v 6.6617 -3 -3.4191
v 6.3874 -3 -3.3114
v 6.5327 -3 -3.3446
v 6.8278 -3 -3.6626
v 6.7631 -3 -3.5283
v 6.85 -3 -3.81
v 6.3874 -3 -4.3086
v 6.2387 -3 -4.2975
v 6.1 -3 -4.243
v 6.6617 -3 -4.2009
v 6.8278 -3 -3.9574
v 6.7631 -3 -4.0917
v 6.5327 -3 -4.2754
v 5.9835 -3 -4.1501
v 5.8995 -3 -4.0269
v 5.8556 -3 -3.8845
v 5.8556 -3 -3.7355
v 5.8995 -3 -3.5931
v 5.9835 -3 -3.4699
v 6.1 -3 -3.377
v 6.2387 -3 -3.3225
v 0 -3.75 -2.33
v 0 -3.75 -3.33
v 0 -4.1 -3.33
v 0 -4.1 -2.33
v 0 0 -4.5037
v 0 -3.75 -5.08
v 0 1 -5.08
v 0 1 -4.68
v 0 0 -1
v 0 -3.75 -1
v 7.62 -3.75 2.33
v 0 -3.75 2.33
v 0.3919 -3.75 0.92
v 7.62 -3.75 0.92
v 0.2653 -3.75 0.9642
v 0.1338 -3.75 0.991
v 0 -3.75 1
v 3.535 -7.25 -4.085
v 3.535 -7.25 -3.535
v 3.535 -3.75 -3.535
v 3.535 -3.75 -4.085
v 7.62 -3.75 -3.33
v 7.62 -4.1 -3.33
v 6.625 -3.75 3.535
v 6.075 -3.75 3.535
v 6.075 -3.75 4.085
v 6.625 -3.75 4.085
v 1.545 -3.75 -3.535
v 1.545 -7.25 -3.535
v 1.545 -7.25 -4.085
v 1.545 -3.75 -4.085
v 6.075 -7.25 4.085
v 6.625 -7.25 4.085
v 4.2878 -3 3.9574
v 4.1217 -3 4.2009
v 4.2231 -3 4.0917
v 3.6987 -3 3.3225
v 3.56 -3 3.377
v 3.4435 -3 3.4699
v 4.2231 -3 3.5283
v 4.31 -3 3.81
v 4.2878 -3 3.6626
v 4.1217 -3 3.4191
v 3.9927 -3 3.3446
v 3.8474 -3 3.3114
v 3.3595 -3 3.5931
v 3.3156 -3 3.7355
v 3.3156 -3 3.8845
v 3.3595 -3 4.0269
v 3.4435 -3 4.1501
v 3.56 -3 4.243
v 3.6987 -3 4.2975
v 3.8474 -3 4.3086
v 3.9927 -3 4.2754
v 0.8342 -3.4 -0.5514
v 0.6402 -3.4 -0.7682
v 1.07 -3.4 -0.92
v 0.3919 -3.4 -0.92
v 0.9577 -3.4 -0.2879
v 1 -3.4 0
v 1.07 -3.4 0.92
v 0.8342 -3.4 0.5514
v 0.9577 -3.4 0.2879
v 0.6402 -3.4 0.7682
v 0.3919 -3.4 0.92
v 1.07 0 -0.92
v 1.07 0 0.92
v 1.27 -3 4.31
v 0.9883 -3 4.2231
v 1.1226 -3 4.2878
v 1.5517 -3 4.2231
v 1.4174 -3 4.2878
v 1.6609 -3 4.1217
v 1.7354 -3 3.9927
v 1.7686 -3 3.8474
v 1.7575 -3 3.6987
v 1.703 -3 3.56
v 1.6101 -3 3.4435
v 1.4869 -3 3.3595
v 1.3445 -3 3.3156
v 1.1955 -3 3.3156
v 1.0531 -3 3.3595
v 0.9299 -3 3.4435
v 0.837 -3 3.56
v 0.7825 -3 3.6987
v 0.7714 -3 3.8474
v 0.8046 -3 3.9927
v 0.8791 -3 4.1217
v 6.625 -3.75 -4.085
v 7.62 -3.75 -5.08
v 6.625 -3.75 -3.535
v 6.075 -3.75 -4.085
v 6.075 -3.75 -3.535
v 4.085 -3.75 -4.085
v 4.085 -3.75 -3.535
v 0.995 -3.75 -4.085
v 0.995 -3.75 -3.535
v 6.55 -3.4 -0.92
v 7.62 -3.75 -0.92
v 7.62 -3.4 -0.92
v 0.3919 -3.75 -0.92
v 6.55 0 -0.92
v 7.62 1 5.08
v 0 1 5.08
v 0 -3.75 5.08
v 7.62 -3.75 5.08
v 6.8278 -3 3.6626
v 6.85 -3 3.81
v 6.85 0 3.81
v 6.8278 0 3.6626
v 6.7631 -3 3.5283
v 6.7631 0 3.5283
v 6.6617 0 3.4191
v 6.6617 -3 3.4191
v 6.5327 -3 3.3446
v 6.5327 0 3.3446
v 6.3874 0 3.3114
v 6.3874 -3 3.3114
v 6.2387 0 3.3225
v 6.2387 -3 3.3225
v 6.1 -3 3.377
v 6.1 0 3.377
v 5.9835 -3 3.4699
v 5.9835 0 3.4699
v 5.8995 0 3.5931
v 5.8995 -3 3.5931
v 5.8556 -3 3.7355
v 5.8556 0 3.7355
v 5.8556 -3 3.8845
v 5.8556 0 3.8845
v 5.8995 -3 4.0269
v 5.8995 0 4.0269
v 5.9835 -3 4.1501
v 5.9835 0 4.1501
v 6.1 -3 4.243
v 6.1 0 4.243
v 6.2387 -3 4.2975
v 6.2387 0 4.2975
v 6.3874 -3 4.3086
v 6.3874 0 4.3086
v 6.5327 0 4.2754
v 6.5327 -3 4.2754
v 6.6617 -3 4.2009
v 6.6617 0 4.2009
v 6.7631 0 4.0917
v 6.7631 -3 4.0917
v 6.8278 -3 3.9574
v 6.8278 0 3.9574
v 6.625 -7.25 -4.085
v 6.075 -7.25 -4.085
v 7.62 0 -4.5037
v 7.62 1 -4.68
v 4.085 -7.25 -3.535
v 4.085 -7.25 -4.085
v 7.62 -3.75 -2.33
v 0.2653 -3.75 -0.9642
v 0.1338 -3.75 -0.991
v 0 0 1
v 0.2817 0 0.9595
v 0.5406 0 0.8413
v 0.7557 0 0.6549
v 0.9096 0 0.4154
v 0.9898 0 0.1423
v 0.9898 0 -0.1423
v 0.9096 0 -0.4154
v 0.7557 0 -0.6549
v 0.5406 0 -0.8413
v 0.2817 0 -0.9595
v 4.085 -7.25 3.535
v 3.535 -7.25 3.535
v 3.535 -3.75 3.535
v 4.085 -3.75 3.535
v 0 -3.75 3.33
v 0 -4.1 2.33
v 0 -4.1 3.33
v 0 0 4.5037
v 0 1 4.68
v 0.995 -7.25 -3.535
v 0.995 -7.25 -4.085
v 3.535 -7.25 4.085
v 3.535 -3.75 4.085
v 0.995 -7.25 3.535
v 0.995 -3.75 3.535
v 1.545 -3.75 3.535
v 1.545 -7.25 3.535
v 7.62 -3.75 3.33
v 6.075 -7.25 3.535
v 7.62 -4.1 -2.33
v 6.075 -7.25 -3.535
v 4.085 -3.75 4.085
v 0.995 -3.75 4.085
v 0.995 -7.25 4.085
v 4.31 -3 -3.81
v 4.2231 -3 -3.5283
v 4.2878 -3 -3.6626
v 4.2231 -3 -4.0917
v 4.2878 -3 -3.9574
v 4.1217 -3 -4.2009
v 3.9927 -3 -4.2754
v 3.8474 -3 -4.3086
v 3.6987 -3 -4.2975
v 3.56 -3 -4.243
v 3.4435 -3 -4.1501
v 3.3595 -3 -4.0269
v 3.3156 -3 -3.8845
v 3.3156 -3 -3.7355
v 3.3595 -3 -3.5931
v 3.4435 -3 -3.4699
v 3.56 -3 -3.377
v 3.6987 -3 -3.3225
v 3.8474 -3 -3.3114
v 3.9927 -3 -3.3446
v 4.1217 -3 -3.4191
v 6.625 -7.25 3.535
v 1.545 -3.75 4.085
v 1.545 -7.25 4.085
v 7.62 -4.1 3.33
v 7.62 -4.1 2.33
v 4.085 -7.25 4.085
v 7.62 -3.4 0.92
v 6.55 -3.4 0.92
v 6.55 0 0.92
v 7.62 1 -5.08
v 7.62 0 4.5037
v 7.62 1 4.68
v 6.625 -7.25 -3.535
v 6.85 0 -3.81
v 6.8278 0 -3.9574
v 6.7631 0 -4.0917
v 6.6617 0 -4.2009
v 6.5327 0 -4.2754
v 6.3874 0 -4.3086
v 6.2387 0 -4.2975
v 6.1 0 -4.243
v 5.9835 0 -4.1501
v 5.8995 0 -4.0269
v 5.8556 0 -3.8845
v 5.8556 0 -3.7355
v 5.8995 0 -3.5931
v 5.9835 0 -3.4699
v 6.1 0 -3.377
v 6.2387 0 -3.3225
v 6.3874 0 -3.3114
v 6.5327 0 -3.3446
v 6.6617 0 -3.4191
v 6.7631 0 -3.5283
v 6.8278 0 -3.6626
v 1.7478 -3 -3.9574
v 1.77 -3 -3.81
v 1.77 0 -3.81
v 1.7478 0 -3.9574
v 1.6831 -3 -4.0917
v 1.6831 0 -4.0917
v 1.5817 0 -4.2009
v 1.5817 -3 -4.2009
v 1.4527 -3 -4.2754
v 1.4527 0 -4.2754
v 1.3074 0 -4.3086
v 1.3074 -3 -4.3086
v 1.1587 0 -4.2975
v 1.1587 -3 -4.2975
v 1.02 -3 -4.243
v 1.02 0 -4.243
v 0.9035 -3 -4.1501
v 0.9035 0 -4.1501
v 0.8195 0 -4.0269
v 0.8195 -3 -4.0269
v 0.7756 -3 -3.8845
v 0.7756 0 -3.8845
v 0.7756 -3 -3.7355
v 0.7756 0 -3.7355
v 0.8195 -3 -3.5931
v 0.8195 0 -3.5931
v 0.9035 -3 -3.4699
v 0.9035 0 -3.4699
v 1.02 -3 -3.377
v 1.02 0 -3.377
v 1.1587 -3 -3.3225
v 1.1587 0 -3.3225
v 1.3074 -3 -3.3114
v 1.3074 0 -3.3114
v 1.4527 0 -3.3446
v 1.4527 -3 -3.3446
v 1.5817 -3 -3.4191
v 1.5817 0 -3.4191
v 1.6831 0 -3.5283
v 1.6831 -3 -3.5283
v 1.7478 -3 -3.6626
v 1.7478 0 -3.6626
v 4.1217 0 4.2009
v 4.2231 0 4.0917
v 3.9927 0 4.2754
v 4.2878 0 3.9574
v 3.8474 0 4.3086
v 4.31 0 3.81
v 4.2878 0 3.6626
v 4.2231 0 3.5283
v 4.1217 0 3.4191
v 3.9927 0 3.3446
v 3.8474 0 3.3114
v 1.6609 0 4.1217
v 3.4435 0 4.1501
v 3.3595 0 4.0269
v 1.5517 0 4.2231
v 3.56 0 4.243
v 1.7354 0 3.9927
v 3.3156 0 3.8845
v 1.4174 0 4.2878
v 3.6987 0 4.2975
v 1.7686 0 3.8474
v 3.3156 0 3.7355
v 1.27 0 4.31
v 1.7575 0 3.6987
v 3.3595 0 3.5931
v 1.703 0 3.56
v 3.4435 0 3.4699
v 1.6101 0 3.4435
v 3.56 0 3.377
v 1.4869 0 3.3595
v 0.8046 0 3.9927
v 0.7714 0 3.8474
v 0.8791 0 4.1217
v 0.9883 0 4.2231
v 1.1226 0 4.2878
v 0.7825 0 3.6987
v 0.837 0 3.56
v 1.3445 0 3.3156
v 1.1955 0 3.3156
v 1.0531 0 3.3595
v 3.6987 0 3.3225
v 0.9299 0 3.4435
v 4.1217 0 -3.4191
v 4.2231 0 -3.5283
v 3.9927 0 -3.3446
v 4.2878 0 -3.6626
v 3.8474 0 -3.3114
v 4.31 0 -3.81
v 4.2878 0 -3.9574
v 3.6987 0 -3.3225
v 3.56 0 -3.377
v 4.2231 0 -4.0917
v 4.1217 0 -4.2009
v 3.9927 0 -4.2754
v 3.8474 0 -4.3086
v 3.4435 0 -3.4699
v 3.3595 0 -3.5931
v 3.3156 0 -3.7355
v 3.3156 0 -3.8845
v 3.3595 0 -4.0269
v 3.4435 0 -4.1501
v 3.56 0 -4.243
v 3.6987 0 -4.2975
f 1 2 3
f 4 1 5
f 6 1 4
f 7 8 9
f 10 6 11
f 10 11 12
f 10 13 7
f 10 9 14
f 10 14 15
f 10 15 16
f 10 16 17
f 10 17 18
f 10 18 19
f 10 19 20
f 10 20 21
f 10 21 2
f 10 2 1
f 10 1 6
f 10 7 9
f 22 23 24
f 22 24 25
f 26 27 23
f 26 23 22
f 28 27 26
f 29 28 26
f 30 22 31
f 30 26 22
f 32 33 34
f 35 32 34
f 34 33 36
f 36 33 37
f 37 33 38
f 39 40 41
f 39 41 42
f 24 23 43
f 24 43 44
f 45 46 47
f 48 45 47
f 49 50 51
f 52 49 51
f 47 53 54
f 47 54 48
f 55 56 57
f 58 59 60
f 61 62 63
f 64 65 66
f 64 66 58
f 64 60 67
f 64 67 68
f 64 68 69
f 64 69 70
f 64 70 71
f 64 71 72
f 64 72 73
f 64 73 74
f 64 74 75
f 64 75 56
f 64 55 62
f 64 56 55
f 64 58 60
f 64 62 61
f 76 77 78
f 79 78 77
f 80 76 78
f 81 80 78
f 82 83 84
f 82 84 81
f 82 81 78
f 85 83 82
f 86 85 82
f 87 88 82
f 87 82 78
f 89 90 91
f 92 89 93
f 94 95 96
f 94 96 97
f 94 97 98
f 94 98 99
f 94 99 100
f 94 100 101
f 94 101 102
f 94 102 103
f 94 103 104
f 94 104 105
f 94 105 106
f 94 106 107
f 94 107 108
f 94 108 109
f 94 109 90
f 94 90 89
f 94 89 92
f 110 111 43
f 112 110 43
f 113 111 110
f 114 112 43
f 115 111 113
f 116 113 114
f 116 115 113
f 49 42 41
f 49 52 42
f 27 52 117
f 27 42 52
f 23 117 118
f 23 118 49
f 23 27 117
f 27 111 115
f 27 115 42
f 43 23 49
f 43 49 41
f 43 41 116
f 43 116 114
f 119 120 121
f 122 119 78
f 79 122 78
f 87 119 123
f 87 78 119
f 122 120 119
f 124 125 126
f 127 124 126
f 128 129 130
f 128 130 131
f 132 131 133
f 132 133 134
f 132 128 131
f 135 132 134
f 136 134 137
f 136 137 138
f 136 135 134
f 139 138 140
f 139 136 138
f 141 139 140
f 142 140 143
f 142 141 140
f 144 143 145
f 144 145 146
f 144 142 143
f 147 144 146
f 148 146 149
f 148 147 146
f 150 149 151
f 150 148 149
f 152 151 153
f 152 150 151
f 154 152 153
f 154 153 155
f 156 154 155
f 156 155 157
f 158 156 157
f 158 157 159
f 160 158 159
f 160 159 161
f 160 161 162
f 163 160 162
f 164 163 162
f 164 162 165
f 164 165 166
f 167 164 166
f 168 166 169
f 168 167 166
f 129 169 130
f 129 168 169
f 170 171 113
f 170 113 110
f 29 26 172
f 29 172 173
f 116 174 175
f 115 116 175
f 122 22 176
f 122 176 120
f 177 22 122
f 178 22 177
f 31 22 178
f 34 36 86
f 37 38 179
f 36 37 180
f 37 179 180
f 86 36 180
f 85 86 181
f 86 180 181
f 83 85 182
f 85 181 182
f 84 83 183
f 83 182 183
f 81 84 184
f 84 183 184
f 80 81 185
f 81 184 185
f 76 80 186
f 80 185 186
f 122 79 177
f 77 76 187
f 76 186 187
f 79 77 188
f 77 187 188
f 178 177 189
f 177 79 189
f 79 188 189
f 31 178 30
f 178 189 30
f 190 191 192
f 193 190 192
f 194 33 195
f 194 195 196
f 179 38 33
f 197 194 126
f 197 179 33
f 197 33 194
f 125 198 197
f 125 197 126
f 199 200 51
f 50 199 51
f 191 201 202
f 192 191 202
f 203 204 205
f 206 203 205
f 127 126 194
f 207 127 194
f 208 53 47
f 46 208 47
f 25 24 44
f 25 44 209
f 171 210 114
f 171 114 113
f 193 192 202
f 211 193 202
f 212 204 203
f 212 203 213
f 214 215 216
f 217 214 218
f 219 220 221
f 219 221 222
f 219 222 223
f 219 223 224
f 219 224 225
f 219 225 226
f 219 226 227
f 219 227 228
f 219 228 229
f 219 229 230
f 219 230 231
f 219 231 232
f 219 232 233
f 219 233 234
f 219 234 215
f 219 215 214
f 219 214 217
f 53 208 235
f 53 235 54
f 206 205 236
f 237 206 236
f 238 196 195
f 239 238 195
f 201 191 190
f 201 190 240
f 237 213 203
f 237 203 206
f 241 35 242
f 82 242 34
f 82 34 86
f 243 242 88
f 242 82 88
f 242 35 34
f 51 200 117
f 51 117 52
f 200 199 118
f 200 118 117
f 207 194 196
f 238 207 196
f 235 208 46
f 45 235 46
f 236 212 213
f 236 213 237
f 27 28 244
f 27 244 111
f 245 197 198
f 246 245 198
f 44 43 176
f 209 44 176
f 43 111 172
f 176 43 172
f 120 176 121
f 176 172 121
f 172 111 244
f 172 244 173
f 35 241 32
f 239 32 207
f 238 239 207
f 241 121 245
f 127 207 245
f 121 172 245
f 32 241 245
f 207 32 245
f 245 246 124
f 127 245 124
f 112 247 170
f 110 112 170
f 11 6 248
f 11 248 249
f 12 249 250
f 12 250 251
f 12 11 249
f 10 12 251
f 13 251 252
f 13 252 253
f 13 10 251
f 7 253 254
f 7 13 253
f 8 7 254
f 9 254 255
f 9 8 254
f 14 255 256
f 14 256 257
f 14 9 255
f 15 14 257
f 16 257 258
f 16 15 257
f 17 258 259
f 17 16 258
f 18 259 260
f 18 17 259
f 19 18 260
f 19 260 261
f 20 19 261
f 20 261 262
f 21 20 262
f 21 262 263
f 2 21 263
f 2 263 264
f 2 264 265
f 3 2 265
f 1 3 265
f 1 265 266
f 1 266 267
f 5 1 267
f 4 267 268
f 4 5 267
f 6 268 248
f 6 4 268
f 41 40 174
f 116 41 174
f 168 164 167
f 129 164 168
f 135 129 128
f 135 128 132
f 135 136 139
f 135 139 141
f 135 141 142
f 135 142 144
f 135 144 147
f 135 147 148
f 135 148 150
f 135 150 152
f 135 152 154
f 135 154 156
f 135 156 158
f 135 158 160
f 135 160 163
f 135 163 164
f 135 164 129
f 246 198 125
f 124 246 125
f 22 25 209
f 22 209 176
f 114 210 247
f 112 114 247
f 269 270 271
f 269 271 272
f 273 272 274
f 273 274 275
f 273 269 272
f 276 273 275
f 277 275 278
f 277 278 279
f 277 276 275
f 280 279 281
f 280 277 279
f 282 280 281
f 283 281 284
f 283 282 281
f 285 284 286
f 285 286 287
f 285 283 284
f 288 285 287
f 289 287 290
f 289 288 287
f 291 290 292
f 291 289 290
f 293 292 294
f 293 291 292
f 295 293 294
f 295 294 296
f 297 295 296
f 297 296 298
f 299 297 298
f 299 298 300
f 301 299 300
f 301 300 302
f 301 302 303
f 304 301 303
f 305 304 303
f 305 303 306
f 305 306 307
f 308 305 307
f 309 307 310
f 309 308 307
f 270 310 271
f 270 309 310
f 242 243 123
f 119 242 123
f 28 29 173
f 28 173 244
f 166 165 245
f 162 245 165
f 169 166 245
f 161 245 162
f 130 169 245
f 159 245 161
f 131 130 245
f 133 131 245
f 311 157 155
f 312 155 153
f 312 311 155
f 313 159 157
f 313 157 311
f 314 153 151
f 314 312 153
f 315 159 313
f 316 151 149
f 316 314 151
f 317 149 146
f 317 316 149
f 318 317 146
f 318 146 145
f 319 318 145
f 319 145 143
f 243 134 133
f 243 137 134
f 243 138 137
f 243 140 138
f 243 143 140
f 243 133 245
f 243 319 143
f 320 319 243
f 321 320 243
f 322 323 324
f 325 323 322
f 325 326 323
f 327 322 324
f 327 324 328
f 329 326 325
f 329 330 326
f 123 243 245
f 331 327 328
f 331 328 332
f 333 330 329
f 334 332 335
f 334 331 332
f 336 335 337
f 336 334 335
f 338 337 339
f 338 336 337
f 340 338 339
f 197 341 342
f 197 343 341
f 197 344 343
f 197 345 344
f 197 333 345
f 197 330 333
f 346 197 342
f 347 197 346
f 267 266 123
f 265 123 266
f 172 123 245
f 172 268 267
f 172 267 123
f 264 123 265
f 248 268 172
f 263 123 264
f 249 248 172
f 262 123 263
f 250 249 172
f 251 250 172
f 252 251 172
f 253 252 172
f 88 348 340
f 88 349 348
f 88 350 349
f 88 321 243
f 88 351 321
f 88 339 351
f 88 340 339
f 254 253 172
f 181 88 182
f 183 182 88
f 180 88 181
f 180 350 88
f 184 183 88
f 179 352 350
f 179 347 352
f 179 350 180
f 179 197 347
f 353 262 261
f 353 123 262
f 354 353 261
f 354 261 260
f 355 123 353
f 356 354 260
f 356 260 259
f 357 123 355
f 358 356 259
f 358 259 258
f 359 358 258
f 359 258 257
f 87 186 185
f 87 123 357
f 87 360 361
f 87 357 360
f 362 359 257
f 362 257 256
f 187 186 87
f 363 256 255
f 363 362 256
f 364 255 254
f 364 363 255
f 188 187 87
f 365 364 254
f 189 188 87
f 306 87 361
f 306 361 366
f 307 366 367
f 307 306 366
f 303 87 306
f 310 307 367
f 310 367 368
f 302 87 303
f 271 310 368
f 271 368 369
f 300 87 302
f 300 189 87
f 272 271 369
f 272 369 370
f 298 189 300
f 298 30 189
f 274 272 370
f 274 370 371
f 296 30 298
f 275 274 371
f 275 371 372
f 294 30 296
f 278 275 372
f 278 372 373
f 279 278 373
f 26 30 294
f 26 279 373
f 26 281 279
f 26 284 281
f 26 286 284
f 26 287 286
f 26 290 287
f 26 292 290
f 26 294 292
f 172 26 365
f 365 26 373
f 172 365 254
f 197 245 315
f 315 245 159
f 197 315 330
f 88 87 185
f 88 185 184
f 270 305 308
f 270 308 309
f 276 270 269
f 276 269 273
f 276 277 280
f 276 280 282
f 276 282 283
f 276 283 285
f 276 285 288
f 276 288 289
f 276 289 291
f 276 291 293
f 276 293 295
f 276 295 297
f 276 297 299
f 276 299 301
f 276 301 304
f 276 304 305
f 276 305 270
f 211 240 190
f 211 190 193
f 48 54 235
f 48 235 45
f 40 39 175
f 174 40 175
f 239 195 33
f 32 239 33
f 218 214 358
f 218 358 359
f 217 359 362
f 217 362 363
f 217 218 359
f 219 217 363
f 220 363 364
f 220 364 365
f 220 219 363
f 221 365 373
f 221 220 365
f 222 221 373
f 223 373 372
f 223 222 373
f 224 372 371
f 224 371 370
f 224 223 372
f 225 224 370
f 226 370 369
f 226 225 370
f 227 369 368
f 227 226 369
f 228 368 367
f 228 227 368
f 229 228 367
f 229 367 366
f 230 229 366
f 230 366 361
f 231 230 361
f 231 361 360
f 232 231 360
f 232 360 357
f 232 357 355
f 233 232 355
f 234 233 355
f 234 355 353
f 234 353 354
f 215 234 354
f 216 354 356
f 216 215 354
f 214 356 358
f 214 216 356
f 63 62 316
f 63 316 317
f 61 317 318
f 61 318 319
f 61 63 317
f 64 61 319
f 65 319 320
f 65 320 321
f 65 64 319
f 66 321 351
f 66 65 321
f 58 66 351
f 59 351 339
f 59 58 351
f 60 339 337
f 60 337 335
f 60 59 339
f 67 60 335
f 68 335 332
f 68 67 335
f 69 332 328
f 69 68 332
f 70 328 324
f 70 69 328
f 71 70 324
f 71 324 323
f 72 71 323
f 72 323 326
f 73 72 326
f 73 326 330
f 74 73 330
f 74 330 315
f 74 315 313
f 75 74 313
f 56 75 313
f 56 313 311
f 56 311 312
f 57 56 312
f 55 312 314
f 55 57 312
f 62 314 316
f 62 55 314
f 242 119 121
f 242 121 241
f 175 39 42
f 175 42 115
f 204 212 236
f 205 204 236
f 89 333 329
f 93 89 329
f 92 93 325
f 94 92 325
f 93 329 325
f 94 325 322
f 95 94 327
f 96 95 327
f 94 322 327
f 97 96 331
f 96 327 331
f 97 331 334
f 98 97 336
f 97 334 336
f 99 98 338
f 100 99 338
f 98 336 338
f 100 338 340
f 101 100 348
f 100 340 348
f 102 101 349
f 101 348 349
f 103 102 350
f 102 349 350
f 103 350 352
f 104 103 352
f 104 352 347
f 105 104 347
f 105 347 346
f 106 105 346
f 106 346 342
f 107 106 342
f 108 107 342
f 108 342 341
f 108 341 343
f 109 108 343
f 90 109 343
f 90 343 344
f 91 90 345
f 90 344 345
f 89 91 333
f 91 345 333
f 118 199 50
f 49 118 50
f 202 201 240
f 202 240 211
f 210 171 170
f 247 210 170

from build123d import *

# Parameters (mm, degrees)
SOCKET_HOUSING_DEPTH  = 7.62
SKETCH3_R             = 0.5
HOLES_DEPTH           = 3
SKETCH4_W             = 0.55
SKETCH4_H             = 0.55
PINS_DEPTH            = 3.5
LPATTERN3_START       = 6.075
LPATTERN3_OUTLINE_W   = 3.5
LPATTERN3_OUTLINE_H   = 0.55
LPATTERN3_DEPTH       = 0.55
LPATTERN3_START_2     = 3.535
LPATTERN3_2_OUTLINE_W = 3.5
LPATTERN3_2_OUTLINE_H = 0.55
LPATTERN3_2_DEPTH     = 0.55
LPATTERN3_START_3     = -3
LPATTERN3_3_OUTLINE_R = 0.5
LPATTERN3_3_DEPTH     = 3
MIRROR2_START         = -3
MIRROR2_OUTLINE_R     = 0.5
MIRROR2_DEPTH         = 3
MIRROR2_START_2       = -7.25
MIRROR2_2_OUTLINE_W   = 0.55
MIRROR2_2_OUTLINE_H   = 0.55
MIRROR2_2_DEPTH       = 3.5
SKETCH5_W             = 5.48
SKETCH5_H             = 1.84
CUT_EXTRUDE3_DEPTH    = 12.6804666


# Read off the part's stored shape, not the designer's step: LPattern3, Mirror2
with BuildPart() as part:
    # Sketch2 → socket_housing (new body)
    with BuildSketch(Plane(origin=(0, 0, 0), x_dir=(0, 0, -1), z_dir=(1, 0, 0))):
        Polygon((-5.08, -3.75), (-3.33, -3.75), (-3.33, -4.1), (-2.33, -4.1), (-2.33, -3.75), (-0.92, -3.75), (-0.92, -3.4), (0, -3.4), (0, 0), (-4.503673019, 0), (-4.68, 1), (-5.08, 1), align=None)
    socket_housing = extrude(amount=SOCKET_HOUSING_DEPTH)

    # Sketch3 → holes (cut)
    with BuildSketch(Plane(origin=(0, 0, 0), x_dir=(1, 0, 0), z_dir=(0, 1, 0))):
        with Locations(Location((1.27, -3.81, 0), (0, 0, 270))):
            Circle(SKETCH3_R)
    extrude(amount=-HOLES_DEPTH, mode=Mode.SUBTRACT)

    # LPattern3 3 outline → LPattern3 3 (cut)
    with BuildSketch(Plane(origin=(0, 0, 0), x_dir=(1, 0, 0), z_dir=(0, 1, 0)).offset(LPATTERN3_START_3)):
        with Locations((6.35, -3.81)):
            Circle(LPATTERN3_3_OUTLINE_R)
        with Locations((3.81, -3.81)):
            Circle(LPATTERN3_3_OUTLINE_R)
    extrude(amount=LPATTERN3_3_DEPTH, mode=Mode.SUBTRACT)

    # Mirror1: socket_housing across plane
    add(socket_housing.mirror(Plane.XY))

    # Mirror2 outline → Mirror2 (cut)
    with BuildSketch(Plane(origin=(0, 0, 0), x_dir=(1, 0, 0), z_dir=(0, 1, 0)).offset(MIRROR2_START)):
        with Locations((6.35, 3.81)):
            Circle(MIRROR2_OUTLINE_R)
        with Locations((3.81, 3.81)):
            Circle(MIRROR2_OUTLINE_R)
        with Locations((1.27, 3.81)):
            Circle(MIRROR2_OUTLINE_R)
    extrude(amount=MIRROR2_DEPTH, mode=Mode.SUBTRACT)

    # Mirror2 2 outline → Mirror2 2 (add)
    with BuildSketch(Plane(origin=(0, 0, 0), x_dir=(1, 0, 0), z_dir=(0, 1, 0)).offset(MIRROR2_START_2)):
        with Locations((6.35, 3.81)):
            Rectangle(MIRROR2_2_OUTLINE_W, MIRROR2_2_OUTLINE_H)
        with Locations((3.81, 3.81)):
            Rectangle(MIRROR2_2_OUTLINE_W, MIRROR2_2_OUTLINE_H)
        with Locations((1.27, 3.81)):
            Rectangle(MIRROR2_2_OUTLINE_W, MIRROR2_2_OUTLINE_H)
    extrude(amount=MIRROR2_2_DEPTH)

    # Sketch5 → Cut-Extrude3 (cut, through all)
    with BuildSketch(Plane(origin=(0, 0, 0), x_dir=(1, 0, 0), z_dir=(0, 1, 0))):
        with BuildLine():
            Line((0, 1), (0, -1))
            ThreePointArc((0, -1), (1, 0), (0, 1))
        make_face()
        with Locations((3.81, 0)):
            Rectangle(SKETCH5_W, SKETCH5_H)
    extrude(amount=-CUT_EXTRUDE3_DEPTH, mode=Mode.SUBTRACT)


with BuildPart() as body_2:
    # Sketch4 → pins (new body)
    with BuildSketch(Plane.XZ.offset(3.75)):
        with Locations((1.27, 3.81)):
            Rectangle(SKETCH4_W, SKETCH4_H)
    extrude(amount=PINS_DEPTH)


with BuildPart() as body_3:
    # LPattern3 outline → LPattern3 (new body)
    with BuildSketch(Plane.YZ.offset(LPATTERN3_START)):
        with Locations((-5.5, 3.81)):
            Rectangle(LPATTERN3_OUTLINE_W, LPATTERN3_OUTLINE_H)
    extrude(amount=LPATTERN3_DEPTH)


with BuildPart() as body_4:
    # LPattern3 2 outline → LPattern3 2 (new body)
    with BuildSketch(Plane.YZ.offset(LPATTERN3_START_2)):
        with Locations((-5.5, 3.81)):
            Rectangle(LPATTERN3_2_OUTLINE_W, LPATTERN3_2_OUTLINE_H)
    extrude(amount=LPATTERN3_2_DEPTH)


solid = Compound([part.part, body_2.part, body_3.part, body_4.part])
